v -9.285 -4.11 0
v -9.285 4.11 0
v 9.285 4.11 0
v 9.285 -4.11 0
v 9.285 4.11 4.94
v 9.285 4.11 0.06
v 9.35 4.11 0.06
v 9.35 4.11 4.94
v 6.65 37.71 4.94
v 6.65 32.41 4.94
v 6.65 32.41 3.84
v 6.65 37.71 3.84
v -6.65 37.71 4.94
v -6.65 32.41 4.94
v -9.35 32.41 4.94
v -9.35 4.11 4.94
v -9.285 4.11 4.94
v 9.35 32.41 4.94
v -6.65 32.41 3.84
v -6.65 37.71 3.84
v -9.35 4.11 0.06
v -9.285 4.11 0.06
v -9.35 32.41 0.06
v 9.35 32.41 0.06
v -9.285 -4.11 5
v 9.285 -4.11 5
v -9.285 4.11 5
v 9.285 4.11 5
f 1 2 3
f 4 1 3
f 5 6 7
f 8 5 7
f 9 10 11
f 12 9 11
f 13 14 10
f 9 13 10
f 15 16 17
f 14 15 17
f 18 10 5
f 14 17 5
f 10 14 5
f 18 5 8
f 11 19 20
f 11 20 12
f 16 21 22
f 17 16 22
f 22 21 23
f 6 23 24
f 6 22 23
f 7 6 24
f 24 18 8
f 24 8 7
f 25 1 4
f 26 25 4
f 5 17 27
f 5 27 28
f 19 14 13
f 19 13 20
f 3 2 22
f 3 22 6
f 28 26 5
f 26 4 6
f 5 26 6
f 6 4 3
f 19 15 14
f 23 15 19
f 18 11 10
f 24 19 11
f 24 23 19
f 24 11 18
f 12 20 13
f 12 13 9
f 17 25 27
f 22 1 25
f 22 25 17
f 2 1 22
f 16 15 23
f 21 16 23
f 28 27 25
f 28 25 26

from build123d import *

# Parameters (mm, degrees)
SKICA1_W                = 18.57
SKICA1_H                = 8.22
P_IDAT_VYSUNUT_M1_DEPTH = 5
SKICA2_W                = 18.7
SKICA2_H                = 4.88
P_IDAT_VYSUNUT_M2_DEPTH = 28.3
SKICA3_W                = 13.3
SKICA3_H                = 1.1
P_IDAT_VYSUNUT_M3_DEPTH = 5.3


with BuildPart() as part:
    # Skica1 → Přidat vysunutím1 (new body)
    with BuildSketch(Plane.XY):
        Rectangle(SKICA1_W, SKICA1_H)
    extrude(amount=P_IDAT_VYSUNUT_M1_DEPTH)

    # Skica2 → Přidat vysunutím2 (add)
    with BuildSketch(Plane(origin=(0, 4.11, 0), x_dir=(1, 0, 0), z_dir=(0, 1, 0))):
        with Locations((0, -2.5)):
            Rectangle(SKICA2_W, SKICA2_H)
    extrude(amount=P_IDAT_VYSUNUT_M2_DEPTH)

    # Skica3 → Přidat vysunutím3 (add)
    with BuildSketch(Plane(origin=(0, 32.41, 0), x_dir=(1, 0, 0), z_dir=(0, 1, 0))):
        with Locations((0, -4.39)):
            Rectangle(SKICA3_W, SKICA3_H)
    extrude(amount=P_IDAT_VYSUNUT_M3_DEPTH)


solid = part.part
